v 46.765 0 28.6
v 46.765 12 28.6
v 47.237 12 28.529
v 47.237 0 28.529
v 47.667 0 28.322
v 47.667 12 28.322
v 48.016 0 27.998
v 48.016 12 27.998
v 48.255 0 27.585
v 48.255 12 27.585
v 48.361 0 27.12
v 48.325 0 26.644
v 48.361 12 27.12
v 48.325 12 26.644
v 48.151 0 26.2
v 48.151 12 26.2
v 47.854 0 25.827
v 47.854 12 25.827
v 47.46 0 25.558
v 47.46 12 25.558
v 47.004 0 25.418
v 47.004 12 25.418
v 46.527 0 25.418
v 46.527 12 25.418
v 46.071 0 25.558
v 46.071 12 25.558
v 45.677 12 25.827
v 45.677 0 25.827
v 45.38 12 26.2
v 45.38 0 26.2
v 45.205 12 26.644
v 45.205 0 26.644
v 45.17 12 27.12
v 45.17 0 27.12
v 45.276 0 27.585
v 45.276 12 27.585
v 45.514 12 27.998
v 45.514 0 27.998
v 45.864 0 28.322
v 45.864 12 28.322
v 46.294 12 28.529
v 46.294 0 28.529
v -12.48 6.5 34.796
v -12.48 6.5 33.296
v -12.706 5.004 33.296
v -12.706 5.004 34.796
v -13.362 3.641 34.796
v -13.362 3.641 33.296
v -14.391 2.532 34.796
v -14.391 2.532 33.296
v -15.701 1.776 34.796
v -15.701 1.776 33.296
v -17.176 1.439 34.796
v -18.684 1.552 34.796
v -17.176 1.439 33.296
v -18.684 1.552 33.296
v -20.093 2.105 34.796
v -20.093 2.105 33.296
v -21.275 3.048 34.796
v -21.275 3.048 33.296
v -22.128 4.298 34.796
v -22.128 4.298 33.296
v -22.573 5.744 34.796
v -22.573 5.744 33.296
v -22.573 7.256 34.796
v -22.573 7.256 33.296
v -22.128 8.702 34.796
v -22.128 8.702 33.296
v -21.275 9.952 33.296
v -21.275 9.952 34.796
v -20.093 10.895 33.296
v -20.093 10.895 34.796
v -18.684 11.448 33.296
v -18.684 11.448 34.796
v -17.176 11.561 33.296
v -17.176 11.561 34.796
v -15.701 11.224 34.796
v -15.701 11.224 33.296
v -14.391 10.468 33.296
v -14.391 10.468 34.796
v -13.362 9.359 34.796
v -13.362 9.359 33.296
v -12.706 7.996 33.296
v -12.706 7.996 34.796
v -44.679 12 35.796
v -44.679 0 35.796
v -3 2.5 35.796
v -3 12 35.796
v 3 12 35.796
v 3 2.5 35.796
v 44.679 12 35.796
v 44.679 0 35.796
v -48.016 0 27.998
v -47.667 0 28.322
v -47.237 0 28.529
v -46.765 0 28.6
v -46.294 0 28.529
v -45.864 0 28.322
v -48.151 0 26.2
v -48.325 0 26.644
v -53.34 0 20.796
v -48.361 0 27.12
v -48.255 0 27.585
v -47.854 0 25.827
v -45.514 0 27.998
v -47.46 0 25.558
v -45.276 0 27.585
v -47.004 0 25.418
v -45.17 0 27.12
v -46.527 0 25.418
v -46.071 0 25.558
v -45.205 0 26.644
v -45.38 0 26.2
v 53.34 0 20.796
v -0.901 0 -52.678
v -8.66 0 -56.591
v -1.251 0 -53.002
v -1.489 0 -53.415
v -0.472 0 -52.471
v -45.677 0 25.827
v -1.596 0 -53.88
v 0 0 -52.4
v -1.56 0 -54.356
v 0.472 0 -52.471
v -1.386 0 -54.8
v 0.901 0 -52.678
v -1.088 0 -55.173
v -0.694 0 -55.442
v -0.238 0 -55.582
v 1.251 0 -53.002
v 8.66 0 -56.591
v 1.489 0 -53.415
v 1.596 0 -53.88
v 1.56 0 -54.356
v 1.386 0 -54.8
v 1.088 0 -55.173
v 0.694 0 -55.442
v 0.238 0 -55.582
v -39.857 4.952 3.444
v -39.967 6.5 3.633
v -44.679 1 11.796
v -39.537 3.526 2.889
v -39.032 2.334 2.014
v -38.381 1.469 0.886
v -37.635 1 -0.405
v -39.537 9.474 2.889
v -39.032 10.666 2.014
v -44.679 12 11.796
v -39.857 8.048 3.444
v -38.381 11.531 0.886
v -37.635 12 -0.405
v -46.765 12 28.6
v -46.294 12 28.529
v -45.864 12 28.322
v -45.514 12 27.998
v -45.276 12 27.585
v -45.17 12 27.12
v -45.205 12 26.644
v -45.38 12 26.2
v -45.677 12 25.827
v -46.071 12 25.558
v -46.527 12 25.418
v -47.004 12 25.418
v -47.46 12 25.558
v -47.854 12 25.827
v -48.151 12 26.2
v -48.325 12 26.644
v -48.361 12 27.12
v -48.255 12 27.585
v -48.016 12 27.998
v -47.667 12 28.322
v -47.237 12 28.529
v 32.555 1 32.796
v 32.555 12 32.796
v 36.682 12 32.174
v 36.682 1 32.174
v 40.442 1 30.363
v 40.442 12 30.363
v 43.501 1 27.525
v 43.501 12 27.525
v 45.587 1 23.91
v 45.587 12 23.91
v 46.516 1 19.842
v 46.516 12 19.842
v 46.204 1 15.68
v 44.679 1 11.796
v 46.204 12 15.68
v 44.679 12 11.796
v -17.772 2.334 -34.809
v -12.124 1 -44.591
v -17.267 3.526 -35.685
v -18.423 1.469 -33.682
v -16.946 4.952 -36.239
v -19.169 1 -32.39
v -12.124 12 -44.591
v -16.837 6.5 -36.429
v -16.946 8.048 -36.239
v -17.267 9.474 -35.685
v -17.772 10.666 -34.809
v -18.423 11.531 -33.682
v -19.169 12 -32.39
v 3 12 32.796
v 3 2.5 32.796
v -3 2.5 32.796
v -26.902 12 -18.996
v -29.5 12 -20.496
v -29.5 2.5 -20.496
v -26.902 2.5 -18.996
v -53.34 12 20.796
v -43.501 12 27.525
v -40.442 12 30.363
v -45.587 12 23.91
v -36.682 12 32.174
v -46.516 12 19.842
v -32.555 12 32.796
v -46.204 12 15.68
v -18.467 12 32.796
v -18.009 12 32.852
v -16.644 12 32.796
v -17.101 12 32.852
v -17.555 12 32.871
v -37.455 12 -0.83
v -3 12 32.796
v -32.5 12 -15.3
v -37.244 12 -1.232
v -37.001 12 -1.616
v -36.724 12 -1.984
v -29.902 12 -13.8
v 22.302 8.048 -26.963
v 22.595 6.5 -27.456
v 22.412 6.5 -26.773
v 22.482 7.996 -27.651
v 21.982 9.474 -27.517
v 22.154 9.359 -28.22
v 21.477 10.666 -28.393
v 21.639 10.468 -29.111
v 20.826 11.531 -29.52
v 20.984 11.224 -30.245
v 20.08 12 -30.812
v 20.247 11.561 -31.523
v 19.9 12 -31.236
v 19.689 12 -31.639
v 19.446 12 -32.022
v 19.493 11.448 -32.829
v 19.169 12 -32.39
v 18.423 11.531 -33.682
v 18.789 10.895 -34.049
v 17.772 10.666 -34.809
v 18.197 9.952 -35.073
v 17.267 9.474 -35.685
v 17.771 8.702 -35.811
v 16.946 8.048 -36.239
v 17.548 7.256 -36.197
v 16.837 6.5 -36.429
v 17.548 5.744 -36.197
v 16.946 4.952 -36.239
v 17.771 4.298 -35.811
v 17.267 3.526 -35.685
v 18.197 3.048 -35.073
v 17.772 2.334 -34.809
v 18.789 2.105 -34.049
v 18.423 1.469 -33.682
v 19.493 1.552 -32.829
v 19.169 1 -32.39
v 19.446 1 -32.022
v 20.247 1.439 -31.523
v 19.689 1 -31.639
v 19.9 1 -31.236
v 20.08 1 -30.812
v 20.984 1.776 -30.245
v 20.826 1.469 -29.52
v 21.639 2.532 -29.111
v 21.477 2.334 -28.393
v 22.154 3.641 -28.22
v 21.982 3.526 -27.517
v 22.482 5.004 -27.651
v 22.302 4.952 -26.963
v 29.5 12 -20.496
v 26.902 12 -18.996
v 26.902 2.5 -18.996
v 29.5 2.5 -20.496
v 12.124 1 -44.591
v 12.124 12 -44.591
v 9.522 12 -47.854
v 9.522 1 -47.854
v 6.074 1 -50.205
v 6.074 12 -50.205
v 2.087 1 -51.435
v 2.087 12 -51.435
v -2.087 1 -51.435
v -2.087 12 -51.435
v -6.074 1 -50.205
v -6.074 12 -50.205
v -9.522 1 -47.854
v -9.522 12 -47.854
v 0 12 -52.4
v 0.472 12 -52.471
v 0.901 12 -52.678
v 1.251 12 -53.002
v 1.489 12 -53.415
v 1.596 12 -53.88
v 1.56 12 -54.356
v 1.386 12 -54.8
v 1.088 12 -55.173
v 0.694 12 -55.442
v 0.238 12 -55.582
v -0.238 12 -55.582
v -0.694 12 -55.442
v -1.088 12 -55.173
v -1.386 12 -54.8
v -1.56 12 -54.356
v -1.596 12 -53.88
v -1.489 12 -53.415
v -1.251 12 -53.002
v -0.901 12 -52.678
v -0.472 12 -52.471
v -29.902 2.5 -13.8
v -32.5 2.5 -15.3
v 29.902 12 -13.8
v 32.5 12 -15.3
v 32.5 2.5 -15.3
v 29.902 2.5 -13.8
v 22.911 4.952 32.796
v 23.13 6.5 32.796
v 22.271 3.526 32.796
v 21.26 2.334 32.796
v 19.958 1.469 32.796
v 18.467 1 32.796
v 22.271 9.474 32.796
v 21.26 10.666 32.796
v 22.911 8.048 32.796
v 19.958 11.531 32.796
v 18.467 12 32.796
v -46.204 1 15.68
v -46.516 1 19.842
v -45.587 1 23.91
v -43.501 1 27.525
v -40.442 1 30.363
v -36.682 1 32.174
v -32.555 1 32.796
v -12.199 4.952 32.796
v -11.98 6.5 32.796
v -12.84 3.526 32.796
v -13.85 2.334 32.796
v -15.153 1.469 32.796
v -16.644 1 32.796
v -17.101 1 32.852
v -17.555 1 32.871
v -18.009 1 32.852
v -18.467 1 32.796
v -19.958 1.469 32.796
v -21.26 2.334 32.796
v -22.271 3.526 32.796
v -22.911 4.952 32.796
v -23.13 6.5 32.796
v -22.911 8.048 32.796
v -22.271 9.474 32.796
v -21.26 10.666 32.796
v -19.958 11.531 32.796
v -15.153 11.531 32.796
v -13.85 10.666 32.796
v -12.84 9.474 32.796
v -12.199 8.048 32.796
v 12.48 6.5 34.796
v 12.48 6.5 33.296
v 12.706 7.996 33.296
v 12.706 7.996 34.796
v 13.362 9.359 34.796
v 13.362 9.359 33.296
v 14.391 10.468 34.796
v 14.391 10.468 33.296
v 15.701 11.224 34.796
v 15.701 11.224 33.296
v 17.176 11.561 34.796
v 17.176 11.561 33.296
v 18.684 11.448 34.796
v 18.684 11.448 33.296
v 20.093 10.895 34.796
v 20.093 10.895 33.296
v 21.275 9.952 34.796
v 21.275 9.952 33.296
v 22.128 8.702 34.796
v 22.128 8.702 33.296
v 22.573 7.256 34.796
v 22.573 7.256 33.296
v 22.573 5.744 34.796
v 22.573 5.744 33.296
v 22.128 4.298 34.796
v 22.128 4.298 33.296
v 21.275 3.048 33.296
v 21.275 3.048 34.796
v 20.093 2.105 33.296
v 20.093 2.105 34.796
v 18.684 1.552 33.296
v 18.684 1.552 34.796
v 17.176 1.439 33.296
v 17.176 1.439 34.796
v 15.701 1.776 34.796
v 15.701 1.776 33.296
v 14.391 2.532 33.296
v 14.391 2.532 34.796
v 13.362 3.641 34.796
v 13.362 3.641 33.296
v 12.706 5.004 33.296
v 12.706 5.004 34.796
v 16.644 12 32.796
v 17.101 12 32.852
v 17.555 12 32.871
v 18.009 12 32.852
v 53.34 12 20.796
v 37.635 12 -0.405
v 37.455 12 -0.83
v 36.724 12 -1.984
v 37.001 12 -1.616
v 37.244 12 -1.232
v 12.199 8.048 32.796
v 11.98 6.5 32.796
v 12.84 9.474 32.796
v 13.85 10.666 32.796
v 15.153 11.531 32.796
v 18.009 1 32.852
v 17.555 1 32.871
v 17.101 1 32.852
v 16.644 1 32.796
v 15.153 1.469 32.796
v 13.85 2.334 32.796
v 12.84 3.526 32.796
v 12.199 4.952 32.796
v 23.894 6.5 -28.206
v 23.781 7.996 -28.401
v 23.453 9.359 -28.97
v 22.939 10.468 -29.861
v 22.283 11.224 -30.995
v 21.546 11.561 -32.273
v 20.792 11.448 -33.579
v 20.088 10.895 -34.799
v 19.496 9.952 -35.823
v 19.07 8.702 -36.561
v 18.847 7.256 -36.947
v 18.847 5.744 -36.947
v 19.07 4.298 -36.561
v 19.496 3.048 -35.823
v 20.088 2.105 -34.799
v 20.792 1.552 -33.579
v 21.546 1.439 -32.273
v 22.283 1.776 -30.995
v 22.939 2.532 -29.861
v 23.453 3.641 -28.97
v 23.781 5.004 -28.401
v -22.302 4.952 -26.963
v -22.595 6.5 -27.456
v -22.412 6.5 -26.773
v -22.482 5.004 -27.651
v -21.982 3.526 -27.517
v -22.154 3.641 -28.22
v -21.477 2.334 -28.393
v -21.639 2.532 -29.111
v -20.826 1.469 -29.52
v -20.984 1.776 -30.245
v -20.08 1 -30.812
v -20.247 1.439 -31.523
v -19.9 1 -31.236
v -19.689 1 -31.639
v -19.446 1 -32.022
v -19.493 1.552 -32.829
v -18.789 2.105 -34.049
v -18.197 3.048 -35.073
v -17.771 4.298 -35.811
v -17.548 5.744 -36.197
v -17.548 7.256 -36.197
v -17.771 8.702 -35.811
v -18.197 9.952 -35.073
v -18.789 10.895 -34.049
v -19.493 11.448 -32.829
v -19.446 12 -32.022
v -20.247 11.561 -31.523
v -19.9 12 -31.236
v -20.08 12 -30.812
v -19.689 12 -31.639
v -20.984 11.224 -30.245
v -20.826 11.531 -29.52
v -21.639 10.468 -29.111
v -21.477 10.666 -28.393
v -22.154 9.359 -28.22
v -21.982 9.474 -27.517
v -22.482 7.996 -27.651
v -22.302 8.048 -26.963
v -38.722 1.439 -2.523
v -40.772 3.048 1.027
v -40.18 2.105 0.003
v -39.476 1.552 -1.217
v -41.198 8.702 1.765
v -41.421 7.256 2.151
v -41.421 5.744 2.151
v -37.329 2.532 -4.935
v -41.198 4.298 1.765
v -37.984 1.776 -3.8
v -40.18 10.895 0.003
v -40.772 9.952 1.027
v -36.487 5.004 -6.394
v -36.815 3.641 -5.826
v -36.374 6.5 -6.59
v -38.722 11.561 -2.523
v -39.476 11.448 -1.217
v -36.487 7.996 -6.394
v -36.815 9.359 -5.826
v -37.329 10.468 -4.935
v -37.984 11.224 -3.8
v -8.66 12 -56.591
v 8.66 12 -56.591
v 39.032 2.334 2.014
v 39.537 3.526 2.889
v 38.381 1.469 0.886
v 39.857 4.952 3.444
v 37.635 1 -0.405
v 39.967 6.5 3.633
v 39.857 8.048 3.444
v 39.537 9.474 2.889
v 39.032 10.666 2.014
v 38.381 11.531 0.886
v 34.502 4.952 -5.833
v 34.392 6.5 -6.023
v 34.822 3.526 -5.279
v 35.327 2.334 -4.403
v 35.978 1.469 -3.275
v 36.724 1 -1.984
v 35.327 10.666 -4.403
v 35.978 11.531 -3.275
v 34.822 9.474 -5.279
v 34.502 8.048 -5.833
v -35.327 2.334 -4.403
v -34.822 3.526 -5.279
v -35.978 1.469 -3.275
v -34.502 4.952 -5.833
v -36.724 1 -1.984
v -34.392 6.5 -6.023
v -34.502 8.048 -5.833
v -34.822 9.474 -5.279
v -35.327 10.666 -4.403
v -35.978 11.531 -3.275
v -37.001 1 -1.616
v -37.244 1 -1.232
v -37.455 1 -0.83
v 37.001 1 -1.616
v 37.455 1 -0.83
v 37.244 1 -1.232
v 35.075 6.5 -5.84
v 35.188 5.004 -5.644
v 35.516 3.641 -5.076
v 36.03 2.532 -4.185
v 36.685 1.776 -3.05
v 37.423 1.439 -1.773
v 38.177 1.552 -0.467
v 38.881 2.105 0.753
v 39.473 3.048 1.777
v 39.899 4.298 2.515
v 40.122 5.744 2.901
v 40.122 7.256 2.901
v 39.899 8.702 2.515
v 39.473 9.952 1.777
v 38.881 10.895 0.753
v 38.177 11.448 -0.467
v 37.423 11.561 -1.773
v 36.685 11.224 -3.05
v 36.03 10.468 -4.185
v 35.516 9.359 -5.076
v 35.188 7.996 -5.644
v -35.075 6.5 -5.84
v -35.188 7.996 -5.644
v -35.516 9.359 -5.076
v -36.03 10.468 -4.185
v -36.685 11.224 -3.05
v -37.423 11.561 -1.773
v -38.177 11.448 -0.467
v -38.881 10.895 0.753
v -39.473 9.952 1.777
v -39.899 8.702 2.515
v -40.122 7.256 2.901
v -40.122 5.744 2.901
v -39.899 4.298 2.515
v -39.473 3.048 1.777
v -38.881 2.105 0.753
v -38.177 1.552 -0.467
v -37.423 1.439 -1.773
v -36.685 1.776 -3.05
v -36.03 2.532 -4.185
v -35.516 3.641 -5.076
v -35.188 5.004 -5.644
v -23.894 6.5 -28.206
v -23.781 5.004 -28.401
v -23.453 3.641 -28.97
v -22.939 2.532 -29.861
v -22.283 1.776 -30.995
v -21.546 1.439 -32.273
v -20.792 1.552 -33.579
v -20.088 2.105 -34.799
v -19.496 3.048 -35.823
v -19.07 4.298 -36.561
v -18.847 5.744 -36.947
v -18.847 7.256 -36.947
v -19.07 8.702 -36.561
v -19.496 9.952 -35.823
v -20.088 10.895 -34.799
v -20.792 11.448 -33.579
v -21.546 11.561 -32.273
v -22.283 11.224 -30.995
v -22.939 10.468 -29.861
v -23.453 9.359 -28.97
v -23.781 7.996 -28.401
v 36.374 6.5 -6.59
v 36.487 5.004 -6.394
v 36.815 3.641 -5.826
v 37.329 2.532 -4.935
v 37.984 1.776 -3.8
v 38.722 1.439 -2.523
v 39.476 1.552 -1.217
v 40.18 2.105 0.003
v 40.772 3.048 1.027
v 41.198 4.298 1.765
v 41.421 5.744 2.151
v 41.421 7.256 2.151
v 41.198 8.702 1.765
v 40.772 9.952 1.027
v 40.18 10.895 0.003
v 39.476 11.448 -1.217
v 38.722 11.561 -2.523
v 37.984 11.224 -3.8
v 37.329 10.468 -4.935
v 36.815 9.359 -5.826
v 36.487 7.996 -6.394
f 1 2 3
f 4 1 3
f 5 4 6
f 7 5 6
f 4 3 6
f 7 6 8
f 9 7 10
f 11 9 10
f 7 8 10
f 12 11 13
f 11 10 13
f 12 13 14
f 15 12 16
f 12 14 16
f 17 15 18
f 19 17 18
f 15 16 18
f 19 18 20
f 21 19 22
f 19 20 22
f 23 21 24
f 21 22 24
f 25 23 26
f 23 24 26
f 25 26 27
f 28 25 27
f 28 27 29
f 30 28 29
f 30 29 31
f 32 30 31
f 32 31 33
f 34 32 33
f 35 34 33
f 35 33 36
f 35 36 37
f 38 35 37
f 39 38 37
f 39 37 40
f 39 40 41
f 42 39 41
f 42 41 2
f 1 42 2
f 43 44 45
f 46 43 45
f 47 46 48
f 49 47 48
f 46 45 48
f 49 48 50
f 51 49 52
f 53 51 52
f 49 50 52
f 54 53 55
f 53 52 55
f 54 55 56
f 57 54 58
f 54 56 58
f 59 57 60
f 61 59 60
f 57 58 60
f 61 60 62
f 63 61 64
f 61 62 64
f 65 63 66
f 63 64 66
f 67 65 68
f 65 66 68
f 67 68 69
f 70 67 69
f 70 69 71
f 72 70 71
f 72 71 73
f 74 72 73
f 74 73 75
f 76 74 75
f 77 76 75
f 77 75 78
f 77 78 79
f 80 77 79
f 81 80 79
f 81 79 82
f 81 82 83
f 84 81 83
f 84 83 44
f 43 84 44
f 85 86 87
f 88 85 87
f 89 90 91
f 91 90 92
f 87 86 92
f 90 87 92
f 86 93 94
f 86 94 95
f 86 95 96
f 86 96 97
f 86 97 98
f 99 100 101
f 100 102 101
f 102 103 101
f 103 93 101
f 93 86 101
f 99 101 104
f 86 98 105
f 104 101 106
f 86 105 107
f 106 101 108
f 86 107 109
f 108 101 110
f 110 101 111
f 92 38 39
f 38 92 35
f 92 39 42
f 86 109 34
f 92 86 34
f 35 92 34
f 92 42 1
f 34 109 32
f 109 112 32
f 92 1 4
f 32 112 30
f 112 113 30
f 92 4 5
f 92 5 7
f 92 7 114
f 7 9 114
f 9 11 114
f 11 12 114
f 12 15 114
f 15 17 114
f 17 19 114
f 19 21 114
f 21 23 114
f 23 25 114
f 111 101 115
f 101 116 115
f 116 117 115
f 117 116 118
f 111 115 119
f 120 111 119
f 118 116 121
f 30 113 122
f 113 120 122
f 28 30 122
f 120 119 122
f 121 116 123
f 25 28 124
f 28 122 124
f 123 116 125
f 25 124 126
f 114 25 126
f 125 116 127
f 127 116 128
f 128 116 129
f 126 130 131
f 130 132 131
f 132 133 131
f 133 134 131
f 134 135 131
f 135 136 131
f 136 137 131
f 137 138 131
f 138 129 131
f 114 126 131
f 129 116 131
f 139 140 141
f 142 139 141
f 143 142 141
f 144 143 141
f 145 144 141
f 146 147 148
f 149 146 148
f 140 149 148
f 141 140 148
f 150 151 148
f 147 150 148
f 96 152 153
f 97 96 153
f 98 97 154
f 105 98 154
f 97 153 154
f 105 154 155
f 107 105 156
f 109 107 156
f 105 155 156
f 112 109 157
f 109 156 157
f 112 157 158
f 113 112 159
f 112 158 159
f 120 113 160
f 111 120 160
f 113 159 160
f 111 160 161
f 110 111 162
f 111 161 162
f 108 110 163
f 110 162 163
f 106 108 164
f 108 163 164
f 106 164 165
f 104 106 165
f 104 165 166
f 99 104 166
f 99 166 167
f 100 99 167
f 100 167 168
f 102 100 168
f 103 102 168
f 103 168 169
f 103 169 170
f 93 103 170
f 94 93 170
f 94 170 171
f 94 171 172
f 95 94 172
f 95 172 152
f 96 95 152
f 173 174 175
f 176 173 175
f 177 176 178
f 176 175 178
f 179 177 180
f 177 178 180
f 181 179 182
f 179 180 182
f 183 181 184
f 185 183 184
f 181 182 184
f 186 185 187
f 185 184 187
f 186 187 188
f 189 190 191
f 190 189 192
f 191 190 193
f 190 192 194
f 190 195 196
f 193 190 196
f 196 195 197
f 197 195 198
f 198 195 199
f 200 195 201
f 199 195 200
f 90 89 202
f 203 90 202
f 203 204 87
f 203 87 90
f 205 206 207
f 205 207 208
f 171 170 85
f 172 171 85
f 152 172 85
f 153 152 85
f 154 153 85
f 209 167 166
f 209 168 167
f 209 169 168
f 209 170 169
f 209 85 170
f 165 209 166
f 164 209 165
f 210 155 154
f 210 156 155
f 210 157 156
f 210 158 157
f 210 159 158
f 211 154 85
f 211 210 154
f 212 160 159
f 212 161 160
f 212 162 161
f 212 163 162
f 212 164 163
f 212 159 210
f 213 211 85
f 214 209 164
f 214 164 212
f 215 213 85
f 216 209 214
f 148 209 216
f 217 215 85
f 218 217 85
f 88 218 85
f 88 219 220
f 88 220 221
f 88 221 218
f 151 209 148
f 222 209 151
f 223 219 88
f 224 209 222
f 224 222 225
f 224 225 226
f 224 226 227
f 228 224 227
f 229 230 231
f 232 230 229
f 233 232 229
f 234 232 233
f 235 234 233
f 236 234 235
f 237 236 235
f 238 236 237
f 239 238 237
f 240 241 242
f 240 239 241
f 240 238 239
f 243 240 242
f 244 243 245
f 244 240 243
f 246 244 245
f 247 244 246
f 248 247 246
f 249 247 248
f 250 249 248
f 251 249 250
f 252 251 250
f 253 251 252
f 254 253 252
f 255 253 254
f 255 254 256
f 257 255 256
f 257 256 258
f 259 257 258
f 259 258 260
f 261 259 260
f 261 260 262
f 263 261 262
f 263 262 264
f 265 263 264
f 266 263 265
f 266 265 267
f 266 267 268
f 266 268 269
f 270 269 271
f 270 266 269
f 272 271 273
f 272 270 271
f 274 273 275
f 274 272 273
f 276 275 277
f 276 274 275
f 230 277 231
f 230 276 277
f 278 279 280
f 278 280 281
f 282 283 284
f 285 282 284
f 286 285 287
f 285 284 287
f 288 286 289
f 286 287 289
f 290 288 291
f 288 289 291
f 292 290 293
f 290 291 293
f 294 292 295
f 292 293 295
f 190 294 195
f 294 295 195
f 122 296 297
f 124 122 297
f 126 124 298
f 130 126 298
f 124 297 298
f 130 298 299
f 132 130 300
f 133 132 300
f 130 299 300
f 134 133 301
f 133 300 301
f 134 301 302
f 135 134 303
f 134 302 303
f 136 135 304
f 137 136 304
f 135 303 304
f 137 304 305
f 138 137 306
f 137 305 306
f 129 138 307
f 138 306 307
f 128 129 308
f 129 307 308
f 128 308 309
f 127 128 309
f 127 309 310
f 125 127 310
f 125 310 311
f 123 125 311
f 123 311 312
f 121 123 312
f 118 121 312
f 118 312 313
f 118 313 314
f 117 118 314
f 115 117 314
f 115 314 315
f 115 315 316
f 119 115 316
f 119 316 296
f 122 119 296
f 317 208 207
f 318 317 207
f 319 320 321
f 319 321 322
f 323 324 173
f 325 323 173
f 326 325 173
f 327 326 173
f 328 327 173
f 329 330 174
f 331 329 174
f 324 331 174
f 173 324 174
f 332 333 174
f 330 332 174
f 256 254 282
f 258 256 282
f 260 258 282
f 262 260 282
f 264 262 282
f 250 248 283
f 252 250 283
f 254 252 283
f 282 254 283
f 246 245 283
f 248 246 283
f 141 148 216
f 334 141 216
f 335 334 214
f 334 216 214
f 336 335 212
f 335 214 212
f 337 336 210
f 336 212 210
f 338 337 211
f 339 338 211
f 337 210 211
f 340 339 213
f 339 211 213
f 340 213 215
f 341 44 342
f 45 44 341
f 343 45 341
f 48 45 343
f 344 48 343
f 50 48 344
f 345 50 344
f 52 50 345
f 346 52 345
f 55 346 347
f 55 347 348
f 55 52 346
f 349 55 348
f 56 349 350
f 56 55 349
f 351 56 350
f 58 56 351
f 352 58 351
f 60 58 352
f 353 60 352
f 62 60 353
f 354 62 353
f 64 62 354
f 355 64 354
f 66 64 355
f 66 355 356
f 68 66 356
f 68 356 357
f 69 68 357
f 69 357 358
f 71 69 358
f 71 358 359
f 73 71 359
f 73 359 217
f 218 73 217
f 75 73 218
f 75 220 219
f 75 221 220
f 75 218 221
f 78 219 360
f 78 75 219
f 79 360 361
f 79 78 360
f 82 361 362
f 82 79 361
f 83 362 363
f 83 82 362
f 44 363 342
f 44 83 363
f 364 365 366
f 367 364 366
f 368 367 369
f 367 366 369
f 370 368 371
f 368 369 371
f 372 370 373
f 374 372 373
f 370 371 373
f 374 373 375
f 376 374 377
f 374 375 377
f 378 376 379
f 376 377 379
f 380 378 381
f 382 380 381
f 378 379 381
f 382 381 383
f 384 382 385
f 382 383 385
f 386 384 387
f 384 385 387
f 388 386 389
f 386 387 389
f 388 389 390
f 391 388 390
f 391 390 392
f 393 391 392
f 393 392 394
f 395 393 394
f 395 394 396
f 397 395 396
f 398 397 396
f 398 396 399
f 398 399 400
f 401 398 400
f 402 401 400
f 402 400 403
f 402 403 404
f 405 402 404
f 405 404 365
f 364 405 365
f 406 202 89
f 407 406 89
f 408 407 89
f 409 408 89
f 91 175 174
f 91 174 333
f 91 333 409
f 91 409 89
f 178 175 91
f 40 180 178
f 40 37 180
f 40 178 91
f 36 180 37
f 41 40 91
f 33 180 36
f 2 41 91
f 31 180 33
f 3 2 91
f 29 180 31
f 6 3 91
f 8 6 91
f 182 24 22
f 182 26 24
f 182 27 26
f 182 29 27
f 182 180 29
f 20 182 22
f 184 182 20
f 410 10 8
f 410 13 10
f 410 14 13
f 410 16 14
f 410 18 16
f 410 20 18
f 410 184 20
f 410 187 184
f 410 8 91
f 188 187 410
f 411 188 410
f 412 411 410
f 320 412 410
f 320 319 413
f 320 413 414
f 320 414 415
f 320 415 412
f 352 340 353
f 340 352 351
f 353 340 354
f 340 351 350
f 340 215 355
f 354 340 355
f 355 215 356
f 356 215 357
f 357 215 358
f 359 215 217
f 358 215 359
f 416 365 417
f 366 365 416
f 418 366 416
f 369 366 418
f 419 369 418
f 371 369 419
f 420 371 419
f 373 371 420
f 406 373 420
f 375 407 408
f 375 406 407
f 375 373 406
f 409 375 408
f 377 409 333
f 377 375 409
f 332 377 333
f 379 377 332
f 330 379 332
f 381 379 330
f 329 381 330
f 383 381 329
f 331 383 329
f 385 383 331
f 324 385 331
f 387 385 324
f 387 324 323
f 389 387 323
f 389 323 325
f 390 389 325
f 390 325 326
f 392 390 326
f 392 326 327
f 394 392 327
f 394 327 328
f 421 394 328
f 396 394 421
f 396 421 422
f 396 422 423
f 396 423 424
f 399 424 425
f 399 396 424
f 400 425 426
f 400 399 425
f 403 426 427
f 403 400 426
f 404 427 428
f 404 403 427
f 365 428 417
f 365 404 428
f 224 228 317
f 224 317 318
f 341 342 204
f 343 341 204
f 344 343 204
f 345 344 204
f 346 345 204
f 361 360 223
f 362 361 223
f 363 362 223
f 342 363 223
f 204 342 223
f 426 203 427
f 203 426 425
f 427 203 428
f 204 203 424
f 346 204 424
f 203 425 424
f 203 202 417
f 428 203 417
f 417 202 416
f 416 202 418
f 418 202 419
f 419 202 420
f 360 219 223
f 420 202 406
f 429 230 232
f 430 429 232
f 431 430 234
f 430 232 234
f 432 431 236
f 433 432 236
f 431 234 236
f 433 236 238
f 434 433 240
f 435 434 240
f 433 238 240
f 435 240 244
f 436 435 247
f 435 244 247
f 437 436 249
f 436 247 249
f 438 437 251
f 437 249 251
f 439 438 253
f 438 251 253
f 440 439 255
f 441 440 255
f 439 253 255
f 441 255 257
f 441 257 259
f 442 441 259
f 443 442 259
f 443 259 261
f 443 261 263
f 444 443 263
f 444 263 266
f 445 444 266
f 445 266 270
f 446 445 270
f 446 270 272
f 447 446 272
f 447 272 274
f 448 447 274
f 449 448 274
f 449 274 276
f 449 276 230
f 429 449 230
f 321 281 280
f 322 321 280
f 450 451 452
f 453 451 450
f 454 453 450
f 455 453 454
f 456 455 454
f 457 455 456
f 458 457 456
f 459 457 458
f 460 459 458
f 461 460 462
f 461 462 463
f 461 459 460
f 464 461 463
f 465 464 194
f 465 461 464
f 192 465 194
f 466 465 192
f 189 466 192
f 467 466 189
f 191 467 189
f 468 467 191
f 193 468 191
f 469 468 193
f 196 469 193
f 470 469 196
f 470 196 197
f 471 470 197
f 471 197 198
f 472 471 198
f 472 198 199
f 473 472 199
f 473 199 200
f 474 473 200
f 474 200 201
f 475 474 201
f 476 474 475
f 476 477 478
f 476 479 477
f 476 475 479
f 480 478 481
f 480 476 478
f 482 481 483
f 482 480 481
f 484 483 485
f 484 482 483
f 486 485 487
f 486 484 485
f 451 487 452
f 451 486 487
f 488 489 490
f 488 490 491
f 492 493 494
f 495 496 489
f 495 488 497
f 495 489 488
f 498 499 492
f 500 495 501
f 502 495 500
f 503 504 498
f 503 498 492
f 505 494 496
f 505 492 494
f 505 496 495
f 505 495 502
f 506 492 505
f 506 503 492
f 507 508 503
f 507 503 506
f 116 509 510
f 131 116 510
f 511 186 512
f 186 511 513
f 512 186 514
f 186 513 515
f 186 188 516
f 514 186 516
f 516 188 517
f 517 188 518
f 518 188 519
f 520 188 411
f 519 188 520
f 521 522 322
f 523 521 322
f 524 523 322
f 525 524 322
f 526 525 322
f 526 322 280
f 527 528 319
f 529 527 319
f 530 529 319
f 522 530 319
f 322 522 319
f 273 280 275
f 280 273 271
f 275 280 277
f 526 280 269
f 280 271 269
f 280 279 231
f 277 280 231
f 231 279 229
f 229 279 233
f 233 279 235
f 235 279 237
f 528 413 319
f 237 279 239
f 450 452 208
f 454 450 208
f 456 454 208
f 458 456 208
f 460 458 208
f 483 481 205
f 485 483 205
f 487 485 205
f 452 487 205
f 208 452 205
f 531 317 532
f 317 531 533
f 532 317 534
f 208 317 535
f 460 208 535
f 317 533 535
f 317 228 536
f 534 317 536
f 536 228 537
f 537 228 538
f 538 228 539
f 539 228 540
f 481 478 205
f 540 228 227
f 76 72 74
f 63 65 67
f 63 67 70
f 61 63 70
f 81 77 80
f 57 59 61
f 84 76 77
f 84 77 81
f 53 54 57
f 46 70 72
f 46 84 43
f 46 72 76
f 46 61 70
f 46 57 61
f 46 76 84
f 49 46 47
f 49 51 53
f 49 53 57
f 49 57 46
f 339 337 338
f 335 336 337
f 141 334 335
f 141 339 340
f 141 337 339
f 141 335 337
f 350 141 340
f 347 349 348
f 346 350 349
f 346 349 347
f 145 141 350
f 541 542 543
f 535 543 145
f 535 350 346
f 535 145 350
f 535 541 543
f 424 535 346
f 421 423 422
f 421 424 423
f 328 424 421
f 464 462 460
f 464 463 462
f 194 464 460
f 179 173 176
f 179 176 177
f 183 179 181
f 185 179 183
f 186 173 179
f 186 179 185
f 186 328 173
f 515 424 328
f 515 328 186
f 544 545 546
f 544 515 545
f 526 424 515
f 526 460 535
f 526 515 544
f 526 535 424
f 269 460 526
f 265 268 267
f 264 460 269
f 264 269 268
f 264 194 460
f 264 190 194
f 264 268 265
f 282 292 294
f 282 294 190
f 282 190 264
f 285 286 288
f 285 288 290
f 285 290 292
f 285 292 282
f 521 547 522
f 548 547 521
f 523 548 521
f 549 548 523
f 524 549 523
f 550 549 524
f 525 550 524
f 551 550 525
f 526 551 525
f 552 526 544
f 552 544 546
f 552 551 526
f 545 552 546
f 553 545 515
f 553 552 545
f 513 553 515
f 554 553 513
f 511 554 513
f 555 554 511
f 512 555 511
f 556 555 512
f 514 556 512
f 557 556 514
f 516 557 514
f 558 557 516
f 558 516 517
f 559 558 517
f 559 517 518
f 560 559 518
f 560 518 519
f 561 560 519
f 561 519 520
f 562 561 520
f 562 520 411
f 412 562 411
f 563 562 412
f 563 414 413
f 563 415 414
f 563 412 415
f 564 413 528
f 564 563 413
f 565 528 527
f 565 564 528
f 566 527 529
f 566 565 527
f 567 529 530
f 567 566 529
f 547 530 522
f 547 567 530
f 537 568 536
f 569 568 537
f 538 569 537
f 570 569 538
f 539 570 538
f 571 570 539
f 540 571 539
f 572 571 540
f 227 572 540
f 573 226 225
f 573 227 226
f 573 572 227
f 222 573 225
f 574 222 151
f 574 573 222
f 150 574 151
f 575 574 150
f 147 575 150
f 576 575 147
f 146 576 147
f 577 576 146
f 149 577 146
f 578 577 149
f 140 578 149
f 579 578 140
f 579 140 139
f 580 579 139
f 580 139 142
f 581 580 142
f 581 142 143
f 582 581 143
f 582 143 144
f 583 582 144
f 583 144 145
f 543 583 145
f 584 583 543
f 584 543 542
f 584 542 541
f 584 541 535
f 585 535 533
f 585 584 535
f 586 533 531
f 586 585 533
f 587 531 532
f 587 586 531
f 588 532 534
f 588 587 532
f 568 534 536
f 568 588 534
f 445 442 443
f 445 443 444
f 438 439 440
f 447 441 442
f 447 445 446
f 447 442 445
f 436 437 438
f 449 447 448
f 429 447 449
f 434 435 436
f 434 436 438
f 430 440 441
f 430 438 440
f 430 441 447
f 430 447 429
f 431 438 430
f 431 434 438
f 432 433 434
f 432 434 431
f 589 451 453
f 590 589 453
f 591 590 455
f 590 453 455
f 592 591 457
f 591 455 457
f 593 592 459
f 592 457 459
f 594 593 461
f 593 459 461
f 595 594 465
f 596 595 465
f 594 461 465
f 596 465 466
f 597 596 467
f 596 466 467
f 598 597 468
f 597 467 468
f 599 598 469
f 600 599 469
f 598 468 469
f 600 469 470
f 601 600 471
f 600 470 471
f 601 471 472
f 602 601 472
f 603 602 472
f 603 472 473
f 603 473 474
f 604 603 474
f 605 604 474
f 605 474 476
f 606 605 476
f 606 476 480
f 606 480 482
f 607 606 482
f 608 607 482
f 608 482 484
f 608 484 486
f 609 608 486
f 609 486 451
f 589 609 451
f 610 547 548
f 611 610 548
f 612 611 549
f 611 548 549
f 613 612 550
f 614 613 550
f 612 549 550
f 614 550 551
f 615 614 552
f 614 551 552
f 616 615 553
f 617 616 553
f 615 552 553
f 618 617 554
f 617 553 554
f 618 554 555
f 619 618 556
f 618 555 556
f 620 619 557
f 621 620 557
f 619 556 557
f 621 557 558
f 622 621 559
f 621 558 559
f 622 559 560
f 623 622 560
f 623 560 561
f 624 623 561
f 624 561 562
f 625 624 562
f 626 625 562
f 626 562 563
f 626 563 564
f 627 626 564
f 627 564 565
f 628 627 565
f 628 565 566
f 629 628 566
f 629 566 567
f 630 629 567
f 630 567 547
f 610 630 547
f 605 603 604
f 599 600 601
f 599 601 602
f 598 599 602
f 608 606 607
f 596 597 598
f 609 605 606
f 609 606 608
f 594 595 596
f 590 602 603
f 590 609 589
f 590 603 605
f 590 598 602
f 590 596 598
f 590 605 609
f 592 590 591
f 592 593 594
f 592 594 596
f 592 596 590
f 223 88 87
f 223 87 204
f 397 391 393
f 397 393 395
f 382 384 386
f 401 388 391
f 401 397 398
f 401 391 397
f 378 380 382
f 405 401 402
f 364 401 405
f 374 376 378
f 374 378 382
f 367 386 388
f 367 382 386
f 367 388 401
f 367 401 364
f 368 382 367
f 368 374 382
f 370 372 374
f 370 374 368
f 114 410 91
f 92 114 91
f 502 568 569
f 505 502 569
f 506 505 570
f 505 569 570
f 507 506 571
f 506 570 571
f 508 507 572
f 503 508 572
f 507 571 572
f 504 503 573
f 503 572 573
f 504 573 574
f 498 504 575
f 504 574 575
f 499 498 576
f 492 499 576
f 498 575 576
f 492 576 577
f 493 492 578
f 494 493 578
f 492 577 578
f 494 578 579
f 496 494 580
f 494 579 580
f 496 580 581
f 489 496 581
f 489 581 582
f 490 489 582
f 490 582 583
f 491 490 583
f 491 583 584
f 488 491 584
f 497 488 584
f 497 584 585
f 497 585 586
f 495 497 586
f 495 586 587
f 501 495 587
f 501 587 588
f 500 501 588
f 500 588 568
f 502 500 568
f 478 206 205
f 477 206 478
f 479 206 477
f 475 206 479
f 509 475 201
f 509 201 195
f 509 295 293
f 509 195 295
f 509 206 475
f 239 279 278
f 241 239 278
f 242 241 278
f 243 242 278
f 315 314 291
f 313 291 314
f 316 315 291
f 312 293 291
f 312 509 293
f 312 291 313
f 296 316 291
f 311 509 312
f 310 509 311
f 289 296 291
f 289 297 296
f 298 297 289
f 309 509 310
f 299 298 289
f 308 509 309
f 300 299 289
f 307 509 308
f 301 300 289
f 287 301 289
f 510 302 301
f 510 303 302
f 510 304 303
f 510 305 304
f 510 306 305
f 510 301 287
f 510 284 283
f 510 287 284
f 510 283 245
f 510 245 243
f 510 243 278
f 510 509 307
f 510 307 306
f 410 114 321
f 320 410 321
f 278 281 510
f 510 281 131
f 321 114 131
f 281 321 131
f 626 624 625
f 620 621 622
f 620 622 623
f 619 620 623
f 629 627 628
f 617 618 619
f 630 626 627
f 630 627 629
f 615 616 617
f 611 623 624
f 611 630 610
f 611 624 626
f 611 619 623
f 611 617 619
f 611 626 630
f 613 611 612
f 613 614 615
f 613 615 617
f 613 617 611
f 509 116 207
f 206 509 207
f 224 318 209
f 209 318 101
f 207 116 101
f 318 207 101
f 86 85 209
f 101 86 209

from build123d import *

# Parameters (mm, degrees)
BOSS_EXTRU_1_DEPTH           = 12
ESQUISSE10_R                 = 1.6
ENL_V_MAT_EXTRU_6_DEPTH      = 96.463780217
ENL_V_MAT_EXTRU_1_DEPTH      = 96.463780217
ENL_V_MAT_EXTRU_2_DEPTH      = 11
ESQUISSE4_W                  = 6
ESQUISSE4_H                  = 3
ENL_V_MAT_EXTRU_3_DEPTH      = 9.5
ESQUISSE11_R                 = 5.075
ENL_V_MAT_EXTRU_7_DEPTH      = 2
R_P_TITION_CIRCULAIRE1_COUNT = 3
CHANFREIN1_SIZE              = 0.5


with BuildPart() as part:
    # Esquisse1 → Boss.-Extru.1 (new body)
    with BuildSketch(Plane(origin=(0, 0, 0), x_dir=(1, 0, 0), z_dir=(0, 1, 0))):
        Polygon((-62, -35.79571669), (62, -35.79571669), (0, 71.59143338), align=None)
    extrude(amount=BOSS_EXTRU_1_DEPTH)

    # Esquisse10 → Enlèv. mat.-Extru.6 (cut, through all)
    with BuildSketch(Plane(origin=(0, 12, 0), x_dir=(1, 0, 0), z_dir=(0, 1, 0))):
        with Locations(Location((0, 54, 0), (0, 0, 270))):
            Circle(ESQUISSE10_R)
        with Locations(Location((46.765371804, -27, 0), (0, 0, 270))):
            Circle(ESQUISSE10_R)
        with Locations(Location((-46.765371804, -27, 0), (0, 0, 270))):
            Circle(ESQUISSE10_R)
    extrude(amount=-ENL_V_MAT_EXTRU_6_DEPTH, mode=Mode.SUBTRACT)

    # Esquisse2 → Enlèv. mat.-Extru.1 (cut, through all)
    with BuildSketch(Plane(origin=(0, 12, 0), x_dir=(1, 0, 0), z_dir=(0, 1, 0))):
        Polygon((-8.660254038, 56.59143338), (8.660254038, 56.59143338), (0, 71.59143338), align=None)
        Polygon((62, -35.79571669), (53.339745962, -20.79571669), (44.679491924, -35.79571669), align=None)
        Polygon((-62, -35.79571669), (-44.679491924, -35.79571669), (-53.339745962, -20.79571669), align=None)
    extrude(amount=-ENL_V_MAT_EXTRU_1_DEPTH, mode=Mode.SUBTRACT)

    # Esquisse3 → Enlèv. mat.-Extru.2 (cut)
    with BuildSketch(Plane(origin=(0, 12, 0), x_dir=(1, 0, 0), z_dir=(0, 1, 0))):
        with BuildLine():
            Line((44.679491924, -11.79571669), (12.124355653, 44.59143338))
            ThreePointArc((12.124355653, 44.59143338), (0, 51.59143338), (-12.124355653, 44.59143338))
            Line((-12.124355653, 44.59143338), (-44.679491924, -11.79571669))
            ThreePointArc((-44.679491924, -11.79571669), (-44.679491924, -25.79571669), (-32.555136271, -32.79571669))
            Line((-32.555136271, -32.79571669), (32.555136271, -32.79571669))
            ThreePointArc((32.555136271, -32.79571669), (44.679491924, -25.79571669), (44.679491924, -11.79571669))
        make_face()
    extrude(amount=-ENL_V_MAT_EXTRU_2_DEPTH, mode=Mode.SUBTRACT)

    # Esquisse4 → Enlèv. mat.-Extru.3 (cut)
    with BuildSketch(Plane(origin=(0, 12, 0), x_dir=(1, 0, 0), z_dir=(0, 1, 0))):
        Polygon((29.901923789, 13.799782134), (26.901923789, 18.995934556), (29.5, 20.495934556), (32.5, 15.299782134), align=None)
        with Locations((0, -34.29571669)):
            Rectangle(ESQUISSE4_W, ESQUISSE4_H)
        Polygon((-29.5, 20.495934556), (-26.901923789, 18.995934556), (-29.901923789, 13.799782134), (-32.5, 15.299782134), align=None)
    extrude(amount=-ENL_V_MAT_EXTRU_3_DEPTH, mode=Mode.SUBTRACT)

    # Esquisse11 → Enlèv. mat.-Extru.7 (cut)
    with BuildSketch(Plane(origin=(0, 0, 32.79571669), x_dir=(-1, 0, 0), z_dir=(0, 0, -1))):
        with Locations((-17.555136271, 6.5)):
            Circle(ESQUISSE11_R)
        with Locations(Location((17.555136271, 6.5, 0), (0, 0, 180))):
            Circle(ESQUISSE11_R)
    enl_v_mat_extru_7 = extrude(amount=-ENL_V_MAT_EXTRU_7_DEPTH, mode=Mode.SUBTRACT)

    # Répétition circulaire1: Enlèv. mat.-Extru.7 ×3 about axis
    r_p_tition_circulaire1_axis = Axis((0, 0, 0), (0, 1, 0))
    for i in range(1, R_P_TITION_CIRCULAIRE1_COUNT):
        add(enl_v_mat_extru_7.rotate(r_p_tition_circulaire1_axis, i * 360 / R_P_TITION_CIRCULAIRE1_COUNT), mode=Mode.SUBTRACT)

    # Chanfrein1
    # the kernel refuses this chamfer: 0.5 mm, written as the material it takes off along each edge
    with BuildSketch(Plane(origin=(17.555136271, 6.5, 32.79571669), x_dir=(-1, 0, 0), z_dir=(0, -1, 0))) as chanfrein1_piece_1_section:
        Polygon((5.075 + CHANFREIN1_SIZE, 0), (5.075, -CHANFREIN1_SIZE), (5.075, 0), align=None)
    chanfrein1_piece_1 = revolve(axis=Axis((17.555136271, 6.5, 32.79571669), (0, 0, -1)), mode=Mode.PRIVATE)
    chanfrein1_piece_1 = split(chanfrein1_piece_1, bisect_by=Plane(origin=(22.868441697, 1, 33.034022115), z_dir=(0, 1, 0)), keep=Keep.TOP, mode=Mode.PRIVATE)
    add(chanfrein1_piece_1, mode=Mode.SUBTRACT)
    with BuildSketch(Plane(origin=(-17.555136271, 6.5, 32.79571669), x_dir=(1, 0, 0), z_dir=(0, 1, 0))) as chanfrein1_piece_2_section:
        Polygon((5.075 + CHANFREIN1_SIZE, 0), (5.075, -CHANFREIN1_SIZE), (5.075, 0), align=None)
    chanfrein1_piece_2 = revolve(axis=Axis((-17.555136271, 6.5, 32.79571669), (0, 0, -1)), mode=Mode.PRIVATE)
    chanfrein1_piece_2 = split(chanfrein1_piece_2, bisect_by=Plane(origin=(-22.868441724, 1, 33.034022142), z_dir=(0, 1, 0)), keep=Keep.TOP, mode=Mode.PRIVATE)
    add(chanfrein1_piece_2, mode=Mode.SUBTRACT)
    with BuildSketch(Plane(origin=(-19.624355653, 6.5, -31.601052323), x_dir=(-0.5000000000000007, 0, 0.8660254037844384), z_dir=(0, 1, 0))) as chanfrein1_piece_3_section:
        Polygon((5.075 + CHANFREIN1_SIZE, 0), (5.075, -CHANFREIN1_SIZE), (5.075, 0), align=None)
    chanfrein1_piece_3 = revolve(axis=Axis((-19.624355653, 6.5, -31.601052323), (0.8660254037844384, 0, 0.5000000000000004)), mode=Mode.PRIVATE)
    chanfrein1_piece_3 = split(chanfrein1_piece_3, bisect_by=Plane(origin=(-17.174081503, 1, -36.32166255), z_dir=(0, 1, 0)), keep=Keep.TOP, mode=Mode.PRIVATE)
    add(chanfrein1_piece_3, mode=Mode.SUBTRACT)
    with BuildSketch(Plane(origin=(-37.179491924, 6.5, -1.194664367), x_dir=(0.4999999999999994, 0, -0.866025403784439), z_dir=(0, -1, 0))) as chanfrein1_piece_4_section:
        Polygon((5.075 + CHANFREIN1_SIZE, 0), (5.075, -CHANFREIN1_SIZE), (5.075, 0), align=None)
    chanfrein1_piece_4 = revolve(axis=Axis((-37.179491924, 6.5, -1.194664367), (0.8660254037844384, 0, 0.5000000000000004)), mode=Mode.PRIVATE)
    chanfrein1_piece_4 = split(chanfrein1_piece_4, bisect_by=Plane(origin=(-40.04252319, 1, 3.287640397), z_dir=(0, 1, 0)), keep=Keep.TOP, mode=Mode.PRIVATE)
    add(chanfrein1_piece_4, mode=Mode.SUBTRACT)
    with BuildSketch(Plane(origin=(37.179491924, 6.5, -1.194664367), x_dir=(-0.4999999999999992, 0, -0.866025403784439), z_dir=(0, 1, 0))) as chanfrein1_piece_5_section:
        Polygon((5.075 + CHANFREIN1_SIZE, 0), (5.075, -CHANFREIN1_SIZE), (5.075, 0), align=None)
    chanfrein1_piece_5 = revolve(axis=Axis((37.179491924, 6.5, -1.194664367), (-0.8660254037844388, 0, 0.49999999999999983)), mode=Mode.PRIVATE)
    chanfrein1_piece_5 = split(chanfrein1_piece_5, bisect_by=Plane(origin=(40.042523227, 1, 3.287640407), z_dir=(0, 1, 0)), keep=Keep.TOP, mode=Mode.PRIVATE)
    add(chanfrein1_piece_5, mode=Mode.SUBTRACT)
    with BuildSketch(Plane(origin=(19.624355653, 6.5, -31.601052323), x_dir=(0.4999999999999997, 0, 0.8660254037844387), z_dir=(0, -1, 0))) as chanfrein1_piece_6_section:
        Polygon((5.075 + CHANFREIN1_SIZE, 0), (5.075, -CHANFREIN1_SIZE), (5.075, 0), align=None)
    chanfrein1_piece_6 = revolve(axis=Axis((19.624355653, 6.5, -31.601052323), (-0.8660254037844388, 0, 0.49999999999999983)), mode=Mode.PRIVATE)
    chanfrein1_piece_6 = split(chanfrein1_piece_6, bisect_by=Plane(origin=(17.174081493, 1, -36.321662513), z_dir=(0, 1, 0)), keep=Keep.TOP, mode=Mode.PRIVATE)
    add(chanfrein1_piece_6, mode=Mode.SUBTRACT)


solid = part.part
